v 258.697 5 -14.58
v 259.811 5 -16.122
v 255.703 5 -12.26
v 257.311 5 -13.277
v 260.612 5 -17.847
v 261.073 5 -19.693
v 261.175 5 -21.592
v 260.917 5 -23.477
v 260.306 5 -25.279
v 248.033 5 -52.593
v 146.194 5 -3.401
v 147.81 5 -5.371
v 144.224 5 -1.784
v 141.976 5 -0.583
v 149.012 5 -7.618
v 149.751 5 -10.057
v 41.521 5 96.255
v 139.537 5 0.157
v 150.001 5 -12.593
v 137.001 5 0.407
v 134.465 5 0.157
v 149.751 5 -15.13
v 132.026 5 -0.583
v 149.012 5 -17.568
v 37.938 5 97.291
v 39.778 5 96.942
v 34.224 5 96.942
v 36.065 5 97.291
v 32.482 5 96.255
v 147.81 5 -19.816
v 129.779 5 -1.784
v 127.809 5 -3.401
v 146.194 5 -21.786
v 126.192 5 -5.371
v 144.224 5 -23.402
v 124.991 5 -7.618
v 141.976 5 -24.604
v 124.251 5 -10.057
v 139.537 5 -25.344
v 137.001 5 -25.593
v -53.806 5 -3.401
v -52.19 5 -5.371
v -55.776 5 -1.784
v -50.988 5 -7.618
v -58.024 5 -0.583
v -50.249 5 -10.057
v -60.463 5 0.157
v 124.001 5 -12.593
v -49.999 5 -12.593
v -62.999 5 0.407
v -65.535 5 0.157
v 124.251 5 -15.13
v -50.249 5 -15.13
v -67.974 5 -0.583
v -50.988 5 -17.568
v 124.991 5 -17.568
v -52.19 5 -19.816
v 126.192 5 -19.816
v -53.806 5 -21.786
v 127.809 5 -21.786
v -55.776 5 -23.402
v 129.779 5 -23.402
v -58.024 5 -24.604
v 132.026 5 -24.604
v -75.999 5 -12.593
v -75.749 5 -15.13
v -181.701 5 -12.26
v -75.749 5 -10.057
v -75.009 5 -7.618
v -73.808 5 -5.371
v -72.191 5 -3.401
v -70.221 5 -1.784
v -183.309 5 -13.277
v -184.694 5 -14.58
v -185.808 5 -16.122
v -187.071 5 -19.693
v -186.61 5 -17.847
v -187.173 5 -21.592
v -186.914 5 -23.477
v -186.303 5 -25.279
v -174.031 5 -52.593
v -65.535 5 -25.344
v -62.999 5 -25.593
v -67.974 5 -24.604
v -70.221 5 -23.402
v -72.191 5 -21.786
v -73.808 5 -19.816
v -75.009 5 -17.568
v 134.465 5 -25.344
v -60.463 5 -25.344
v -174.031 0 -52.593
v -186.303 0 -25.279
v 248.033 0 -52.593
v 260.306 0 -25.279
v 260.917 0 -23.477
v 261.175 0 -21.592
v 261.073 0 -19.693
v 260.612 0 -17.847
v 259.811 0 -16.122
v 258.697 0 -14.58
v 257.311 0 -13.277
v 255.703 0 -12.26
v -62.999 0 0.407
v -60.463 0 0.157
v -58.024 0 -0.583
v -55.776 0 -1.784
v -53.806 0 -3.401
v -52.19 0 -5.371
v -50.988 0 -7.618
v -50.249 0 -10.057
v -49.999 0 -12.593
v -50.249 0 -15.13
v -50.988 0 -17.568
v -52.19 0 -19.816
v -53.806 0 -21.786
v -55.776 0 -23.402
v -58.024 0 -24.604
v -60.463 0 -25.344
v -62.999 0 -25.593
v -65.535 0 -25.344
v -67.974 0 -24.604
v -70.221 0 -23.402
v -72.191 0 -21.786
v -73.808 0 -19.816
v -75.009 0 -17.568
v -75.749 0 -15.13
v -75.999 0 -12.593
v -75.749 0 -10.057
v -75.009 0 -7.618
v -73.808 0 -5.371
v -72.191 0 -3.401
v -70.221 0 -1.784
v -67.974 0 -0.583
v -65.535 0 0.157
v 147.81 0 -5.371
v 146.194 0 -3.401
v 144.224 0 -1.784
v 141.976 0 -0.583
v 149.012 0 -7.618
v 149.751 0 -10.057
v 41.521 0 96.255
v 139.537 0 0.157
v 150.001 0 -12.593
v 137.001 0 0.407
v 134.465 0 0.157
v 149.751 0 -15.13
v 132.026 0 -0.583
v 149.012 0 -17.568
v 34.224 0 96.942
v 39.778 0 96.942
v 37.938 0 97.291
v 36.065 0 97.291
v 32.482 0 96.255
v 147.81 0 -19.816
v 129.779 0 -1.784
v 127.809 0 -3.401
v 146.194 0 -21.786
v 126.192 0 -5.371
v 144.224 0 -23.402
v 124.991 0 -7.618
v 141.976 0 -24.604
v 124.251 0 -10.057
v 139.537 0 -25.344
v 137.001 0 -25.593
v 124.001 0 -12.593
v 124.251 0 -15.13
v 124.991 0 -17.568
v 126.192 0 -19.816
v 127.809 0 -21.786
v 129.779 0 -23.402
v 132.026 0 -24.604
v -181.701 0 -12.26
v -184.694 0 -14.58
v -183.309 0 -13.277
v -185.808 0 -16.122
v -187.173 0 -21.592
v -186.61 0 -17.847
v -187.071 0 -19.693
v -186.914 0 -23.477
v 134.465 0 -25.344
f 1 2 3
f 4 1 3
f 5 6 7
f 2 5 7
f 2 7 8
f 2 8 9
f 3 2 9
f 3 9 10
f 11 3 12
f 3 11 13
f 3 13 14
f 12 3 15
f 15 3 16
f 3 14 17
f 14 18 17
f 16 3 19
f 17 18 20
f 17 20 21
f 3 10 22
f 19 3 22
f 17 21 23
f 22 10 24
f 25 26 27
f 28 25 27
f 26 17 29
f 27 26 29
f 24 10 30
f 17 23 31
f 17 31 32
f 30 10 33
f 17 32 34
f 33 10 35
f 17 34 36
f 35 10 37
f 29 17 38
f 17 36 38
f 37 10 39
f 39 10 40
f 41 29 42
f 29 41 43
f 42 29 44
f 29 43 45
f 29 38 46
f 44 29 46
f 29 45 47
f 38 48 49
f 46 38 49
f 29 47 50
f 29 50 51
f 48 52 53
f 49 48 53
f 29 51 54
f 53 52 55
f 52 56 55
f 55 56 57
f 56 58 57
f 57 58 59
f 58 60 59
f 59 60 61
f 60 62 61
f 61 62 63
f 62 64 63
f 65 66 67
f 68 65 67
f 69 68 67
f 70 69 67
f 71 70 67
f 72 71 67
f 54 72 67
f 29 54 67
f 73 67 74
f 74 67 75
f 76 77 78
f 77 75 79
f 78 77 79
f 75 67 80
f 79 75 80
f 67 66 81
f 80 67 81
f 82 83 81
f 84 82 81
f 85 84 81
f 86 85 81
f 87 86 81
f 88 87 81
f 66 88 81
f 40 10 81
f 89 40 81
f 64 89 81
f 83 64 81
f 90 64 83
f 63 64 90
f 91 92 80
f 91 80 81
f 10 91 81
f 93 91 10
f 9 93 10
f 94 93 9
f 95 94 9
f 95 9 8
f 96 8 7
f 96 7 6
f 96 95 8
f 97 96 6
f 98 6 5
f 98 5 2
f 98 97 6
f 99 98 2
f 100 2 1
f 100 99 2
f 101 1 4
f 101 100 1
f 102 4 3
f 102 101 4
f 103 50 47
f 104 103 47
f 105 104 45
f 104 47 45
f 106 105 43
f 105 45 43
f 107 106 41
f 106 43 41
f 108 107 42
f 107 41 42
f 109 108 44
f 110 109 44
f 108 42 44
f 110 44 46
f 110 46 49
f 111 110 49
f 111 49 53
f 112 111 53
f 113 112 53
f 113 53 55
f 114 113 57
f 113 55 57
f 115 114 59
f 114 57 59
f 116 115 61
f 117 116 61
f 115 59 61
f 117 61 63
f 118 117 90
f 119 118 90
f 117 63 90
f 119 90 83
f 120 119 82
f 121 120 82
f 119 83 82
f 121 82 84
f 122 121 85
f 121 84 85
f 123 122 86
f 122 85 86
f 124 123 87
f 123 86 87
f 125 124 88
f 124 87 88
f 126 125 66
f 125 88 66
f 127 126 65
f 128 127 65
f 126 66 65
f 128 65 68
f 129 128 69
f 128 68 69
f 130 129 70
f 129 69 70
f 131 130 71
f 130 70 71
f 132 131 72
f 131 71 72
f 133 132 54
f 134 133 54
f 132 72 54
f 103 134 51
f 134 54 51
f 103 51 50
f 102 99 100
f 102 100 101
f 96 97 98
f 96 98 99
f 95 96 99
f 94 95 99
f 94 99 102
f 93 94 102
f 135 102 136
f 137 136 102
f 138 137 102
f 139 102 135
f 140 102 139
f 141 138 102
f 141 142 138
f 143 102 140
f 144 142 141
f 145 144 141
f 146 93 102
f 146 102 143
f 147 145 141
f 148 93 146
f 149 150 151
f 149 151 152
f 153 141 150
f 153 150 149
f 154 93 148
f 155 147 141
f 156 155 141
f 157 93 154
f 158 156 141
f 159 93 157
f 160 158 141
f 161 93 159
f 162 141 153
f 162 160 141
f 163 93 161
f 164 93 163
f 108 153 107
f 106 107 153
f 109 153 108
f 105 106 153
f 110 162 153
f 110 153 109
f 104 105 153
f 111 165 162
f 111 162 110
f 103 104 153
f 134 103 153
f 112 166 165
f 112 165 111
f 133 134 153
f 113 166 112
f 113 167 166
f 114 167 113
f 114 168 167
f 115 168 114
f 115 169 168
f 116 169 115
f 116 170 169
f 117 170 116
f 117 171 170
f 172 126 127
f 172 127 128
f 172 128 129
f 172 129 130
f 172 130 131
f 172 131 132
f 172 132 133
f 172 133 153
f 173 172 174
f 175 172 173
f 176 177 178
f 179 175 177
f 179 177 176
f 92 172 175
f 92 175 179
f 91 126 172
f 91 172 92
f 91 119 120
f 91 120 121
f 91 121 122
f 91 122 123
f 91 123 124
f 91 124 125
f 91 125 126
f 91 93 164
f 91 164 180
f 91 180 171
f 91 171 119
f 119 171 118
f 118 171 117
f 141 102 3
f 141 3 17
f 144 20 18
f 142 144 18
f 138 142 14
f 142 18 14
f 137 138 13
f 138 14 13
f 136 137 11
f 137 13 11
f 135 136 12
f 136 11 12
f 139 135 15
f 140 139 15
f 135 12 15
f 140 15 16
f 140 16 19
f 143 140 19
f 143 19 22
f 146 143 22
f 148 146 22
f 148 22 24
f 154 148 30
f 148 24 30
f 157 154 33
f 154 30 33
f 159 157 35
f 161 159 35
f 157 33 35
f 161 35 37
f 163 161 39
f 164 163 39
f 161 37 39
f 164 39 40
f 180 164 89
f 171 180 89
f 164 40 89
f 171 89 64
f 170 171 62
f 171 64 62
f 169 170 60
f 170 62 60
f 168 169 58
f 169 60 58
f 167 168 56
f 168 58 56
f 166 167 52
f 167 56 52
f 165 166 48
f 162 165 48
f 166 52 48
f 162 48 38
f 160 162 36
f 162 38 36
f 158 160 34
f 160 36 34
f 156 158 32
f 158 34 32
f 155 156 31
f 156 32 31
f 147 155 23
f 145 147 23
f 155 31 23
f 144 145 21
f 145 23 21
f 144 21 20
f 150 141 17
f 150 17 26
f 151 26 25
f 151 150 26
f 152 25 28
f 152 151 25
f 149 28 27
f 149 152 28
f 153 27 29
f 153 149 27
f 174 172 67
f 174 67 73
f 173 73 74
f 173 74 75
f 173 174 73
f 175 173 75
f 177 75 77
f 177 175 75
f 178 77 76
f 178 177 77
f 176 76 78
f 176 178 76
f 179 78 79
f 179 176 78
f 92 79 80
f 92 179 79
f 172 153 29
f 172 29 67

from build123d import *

# Parameters (mm, degrees)
BOSS_EXTRUDE1_DEPTH = 5
SKETCH2_R           = 13
CUT_EXTRUDE1_DEPTH  = 5


with BuildPart() as part:
    # Sketch1 → Boss-Extrude1 (new body)
    with BuildSketch(Plane(origin=(0, 0, 0), x_dir=(1, 0, 0), z_dir=(0, 1, 0))):
        with BuildLine():
            Line((248.032931618, 52.593341059), (260.305567907, 25.2785247))
            ThreePointArc((260.305567907, 25.2785247), (260.612237386, 17.847313664), (255.703480887, 12.259733394))
            Line((255.703480887, 12.259733394), (41.520626689, -96.255259938))
            ThreePointArc((41.520626689, -96.255259938), (37.001121909, -97.334829649), (32.481617129, -96.255259938))
            Line((32.481617129, -96.255259938), (-181.70123707, 12.259733394))
            ThreePointArc((-181.70123707, 12.259733394), (-186.609993569, 17.847313664), (-186.30332409, 25.2785247))
            Line((-186.30332409, 25.2785247), (-174.0306878, 52.593341059))
            Line((-174.0306878, 52.593341059), (248.032931618, 52.593341059))
        make_face()
    extrude(amount=BOSS_EXTRUDE1_DEPTH)

    # Sketch2 → Cut-Extrude1 (cut)
    with BuildSketch(Plane(origin=(0, 5, 0), x_dir=(1, 0, 0), z_dir=(0, 1, 0))):
        with Locations(Location((137.001121909, 12.593341059, 0), (0, 0, 270))):
            Circle(SKETCH2_R)
        with Locations(Location((-62.998878091, 12.593341059, 0), (0, 0, 270))):
            Circle(SKETCH2_R)
    extrude(amount=-CUT_EXTRUDE1_DEPTH, mode=Mode.SUBTRACT)


solid = part.part
